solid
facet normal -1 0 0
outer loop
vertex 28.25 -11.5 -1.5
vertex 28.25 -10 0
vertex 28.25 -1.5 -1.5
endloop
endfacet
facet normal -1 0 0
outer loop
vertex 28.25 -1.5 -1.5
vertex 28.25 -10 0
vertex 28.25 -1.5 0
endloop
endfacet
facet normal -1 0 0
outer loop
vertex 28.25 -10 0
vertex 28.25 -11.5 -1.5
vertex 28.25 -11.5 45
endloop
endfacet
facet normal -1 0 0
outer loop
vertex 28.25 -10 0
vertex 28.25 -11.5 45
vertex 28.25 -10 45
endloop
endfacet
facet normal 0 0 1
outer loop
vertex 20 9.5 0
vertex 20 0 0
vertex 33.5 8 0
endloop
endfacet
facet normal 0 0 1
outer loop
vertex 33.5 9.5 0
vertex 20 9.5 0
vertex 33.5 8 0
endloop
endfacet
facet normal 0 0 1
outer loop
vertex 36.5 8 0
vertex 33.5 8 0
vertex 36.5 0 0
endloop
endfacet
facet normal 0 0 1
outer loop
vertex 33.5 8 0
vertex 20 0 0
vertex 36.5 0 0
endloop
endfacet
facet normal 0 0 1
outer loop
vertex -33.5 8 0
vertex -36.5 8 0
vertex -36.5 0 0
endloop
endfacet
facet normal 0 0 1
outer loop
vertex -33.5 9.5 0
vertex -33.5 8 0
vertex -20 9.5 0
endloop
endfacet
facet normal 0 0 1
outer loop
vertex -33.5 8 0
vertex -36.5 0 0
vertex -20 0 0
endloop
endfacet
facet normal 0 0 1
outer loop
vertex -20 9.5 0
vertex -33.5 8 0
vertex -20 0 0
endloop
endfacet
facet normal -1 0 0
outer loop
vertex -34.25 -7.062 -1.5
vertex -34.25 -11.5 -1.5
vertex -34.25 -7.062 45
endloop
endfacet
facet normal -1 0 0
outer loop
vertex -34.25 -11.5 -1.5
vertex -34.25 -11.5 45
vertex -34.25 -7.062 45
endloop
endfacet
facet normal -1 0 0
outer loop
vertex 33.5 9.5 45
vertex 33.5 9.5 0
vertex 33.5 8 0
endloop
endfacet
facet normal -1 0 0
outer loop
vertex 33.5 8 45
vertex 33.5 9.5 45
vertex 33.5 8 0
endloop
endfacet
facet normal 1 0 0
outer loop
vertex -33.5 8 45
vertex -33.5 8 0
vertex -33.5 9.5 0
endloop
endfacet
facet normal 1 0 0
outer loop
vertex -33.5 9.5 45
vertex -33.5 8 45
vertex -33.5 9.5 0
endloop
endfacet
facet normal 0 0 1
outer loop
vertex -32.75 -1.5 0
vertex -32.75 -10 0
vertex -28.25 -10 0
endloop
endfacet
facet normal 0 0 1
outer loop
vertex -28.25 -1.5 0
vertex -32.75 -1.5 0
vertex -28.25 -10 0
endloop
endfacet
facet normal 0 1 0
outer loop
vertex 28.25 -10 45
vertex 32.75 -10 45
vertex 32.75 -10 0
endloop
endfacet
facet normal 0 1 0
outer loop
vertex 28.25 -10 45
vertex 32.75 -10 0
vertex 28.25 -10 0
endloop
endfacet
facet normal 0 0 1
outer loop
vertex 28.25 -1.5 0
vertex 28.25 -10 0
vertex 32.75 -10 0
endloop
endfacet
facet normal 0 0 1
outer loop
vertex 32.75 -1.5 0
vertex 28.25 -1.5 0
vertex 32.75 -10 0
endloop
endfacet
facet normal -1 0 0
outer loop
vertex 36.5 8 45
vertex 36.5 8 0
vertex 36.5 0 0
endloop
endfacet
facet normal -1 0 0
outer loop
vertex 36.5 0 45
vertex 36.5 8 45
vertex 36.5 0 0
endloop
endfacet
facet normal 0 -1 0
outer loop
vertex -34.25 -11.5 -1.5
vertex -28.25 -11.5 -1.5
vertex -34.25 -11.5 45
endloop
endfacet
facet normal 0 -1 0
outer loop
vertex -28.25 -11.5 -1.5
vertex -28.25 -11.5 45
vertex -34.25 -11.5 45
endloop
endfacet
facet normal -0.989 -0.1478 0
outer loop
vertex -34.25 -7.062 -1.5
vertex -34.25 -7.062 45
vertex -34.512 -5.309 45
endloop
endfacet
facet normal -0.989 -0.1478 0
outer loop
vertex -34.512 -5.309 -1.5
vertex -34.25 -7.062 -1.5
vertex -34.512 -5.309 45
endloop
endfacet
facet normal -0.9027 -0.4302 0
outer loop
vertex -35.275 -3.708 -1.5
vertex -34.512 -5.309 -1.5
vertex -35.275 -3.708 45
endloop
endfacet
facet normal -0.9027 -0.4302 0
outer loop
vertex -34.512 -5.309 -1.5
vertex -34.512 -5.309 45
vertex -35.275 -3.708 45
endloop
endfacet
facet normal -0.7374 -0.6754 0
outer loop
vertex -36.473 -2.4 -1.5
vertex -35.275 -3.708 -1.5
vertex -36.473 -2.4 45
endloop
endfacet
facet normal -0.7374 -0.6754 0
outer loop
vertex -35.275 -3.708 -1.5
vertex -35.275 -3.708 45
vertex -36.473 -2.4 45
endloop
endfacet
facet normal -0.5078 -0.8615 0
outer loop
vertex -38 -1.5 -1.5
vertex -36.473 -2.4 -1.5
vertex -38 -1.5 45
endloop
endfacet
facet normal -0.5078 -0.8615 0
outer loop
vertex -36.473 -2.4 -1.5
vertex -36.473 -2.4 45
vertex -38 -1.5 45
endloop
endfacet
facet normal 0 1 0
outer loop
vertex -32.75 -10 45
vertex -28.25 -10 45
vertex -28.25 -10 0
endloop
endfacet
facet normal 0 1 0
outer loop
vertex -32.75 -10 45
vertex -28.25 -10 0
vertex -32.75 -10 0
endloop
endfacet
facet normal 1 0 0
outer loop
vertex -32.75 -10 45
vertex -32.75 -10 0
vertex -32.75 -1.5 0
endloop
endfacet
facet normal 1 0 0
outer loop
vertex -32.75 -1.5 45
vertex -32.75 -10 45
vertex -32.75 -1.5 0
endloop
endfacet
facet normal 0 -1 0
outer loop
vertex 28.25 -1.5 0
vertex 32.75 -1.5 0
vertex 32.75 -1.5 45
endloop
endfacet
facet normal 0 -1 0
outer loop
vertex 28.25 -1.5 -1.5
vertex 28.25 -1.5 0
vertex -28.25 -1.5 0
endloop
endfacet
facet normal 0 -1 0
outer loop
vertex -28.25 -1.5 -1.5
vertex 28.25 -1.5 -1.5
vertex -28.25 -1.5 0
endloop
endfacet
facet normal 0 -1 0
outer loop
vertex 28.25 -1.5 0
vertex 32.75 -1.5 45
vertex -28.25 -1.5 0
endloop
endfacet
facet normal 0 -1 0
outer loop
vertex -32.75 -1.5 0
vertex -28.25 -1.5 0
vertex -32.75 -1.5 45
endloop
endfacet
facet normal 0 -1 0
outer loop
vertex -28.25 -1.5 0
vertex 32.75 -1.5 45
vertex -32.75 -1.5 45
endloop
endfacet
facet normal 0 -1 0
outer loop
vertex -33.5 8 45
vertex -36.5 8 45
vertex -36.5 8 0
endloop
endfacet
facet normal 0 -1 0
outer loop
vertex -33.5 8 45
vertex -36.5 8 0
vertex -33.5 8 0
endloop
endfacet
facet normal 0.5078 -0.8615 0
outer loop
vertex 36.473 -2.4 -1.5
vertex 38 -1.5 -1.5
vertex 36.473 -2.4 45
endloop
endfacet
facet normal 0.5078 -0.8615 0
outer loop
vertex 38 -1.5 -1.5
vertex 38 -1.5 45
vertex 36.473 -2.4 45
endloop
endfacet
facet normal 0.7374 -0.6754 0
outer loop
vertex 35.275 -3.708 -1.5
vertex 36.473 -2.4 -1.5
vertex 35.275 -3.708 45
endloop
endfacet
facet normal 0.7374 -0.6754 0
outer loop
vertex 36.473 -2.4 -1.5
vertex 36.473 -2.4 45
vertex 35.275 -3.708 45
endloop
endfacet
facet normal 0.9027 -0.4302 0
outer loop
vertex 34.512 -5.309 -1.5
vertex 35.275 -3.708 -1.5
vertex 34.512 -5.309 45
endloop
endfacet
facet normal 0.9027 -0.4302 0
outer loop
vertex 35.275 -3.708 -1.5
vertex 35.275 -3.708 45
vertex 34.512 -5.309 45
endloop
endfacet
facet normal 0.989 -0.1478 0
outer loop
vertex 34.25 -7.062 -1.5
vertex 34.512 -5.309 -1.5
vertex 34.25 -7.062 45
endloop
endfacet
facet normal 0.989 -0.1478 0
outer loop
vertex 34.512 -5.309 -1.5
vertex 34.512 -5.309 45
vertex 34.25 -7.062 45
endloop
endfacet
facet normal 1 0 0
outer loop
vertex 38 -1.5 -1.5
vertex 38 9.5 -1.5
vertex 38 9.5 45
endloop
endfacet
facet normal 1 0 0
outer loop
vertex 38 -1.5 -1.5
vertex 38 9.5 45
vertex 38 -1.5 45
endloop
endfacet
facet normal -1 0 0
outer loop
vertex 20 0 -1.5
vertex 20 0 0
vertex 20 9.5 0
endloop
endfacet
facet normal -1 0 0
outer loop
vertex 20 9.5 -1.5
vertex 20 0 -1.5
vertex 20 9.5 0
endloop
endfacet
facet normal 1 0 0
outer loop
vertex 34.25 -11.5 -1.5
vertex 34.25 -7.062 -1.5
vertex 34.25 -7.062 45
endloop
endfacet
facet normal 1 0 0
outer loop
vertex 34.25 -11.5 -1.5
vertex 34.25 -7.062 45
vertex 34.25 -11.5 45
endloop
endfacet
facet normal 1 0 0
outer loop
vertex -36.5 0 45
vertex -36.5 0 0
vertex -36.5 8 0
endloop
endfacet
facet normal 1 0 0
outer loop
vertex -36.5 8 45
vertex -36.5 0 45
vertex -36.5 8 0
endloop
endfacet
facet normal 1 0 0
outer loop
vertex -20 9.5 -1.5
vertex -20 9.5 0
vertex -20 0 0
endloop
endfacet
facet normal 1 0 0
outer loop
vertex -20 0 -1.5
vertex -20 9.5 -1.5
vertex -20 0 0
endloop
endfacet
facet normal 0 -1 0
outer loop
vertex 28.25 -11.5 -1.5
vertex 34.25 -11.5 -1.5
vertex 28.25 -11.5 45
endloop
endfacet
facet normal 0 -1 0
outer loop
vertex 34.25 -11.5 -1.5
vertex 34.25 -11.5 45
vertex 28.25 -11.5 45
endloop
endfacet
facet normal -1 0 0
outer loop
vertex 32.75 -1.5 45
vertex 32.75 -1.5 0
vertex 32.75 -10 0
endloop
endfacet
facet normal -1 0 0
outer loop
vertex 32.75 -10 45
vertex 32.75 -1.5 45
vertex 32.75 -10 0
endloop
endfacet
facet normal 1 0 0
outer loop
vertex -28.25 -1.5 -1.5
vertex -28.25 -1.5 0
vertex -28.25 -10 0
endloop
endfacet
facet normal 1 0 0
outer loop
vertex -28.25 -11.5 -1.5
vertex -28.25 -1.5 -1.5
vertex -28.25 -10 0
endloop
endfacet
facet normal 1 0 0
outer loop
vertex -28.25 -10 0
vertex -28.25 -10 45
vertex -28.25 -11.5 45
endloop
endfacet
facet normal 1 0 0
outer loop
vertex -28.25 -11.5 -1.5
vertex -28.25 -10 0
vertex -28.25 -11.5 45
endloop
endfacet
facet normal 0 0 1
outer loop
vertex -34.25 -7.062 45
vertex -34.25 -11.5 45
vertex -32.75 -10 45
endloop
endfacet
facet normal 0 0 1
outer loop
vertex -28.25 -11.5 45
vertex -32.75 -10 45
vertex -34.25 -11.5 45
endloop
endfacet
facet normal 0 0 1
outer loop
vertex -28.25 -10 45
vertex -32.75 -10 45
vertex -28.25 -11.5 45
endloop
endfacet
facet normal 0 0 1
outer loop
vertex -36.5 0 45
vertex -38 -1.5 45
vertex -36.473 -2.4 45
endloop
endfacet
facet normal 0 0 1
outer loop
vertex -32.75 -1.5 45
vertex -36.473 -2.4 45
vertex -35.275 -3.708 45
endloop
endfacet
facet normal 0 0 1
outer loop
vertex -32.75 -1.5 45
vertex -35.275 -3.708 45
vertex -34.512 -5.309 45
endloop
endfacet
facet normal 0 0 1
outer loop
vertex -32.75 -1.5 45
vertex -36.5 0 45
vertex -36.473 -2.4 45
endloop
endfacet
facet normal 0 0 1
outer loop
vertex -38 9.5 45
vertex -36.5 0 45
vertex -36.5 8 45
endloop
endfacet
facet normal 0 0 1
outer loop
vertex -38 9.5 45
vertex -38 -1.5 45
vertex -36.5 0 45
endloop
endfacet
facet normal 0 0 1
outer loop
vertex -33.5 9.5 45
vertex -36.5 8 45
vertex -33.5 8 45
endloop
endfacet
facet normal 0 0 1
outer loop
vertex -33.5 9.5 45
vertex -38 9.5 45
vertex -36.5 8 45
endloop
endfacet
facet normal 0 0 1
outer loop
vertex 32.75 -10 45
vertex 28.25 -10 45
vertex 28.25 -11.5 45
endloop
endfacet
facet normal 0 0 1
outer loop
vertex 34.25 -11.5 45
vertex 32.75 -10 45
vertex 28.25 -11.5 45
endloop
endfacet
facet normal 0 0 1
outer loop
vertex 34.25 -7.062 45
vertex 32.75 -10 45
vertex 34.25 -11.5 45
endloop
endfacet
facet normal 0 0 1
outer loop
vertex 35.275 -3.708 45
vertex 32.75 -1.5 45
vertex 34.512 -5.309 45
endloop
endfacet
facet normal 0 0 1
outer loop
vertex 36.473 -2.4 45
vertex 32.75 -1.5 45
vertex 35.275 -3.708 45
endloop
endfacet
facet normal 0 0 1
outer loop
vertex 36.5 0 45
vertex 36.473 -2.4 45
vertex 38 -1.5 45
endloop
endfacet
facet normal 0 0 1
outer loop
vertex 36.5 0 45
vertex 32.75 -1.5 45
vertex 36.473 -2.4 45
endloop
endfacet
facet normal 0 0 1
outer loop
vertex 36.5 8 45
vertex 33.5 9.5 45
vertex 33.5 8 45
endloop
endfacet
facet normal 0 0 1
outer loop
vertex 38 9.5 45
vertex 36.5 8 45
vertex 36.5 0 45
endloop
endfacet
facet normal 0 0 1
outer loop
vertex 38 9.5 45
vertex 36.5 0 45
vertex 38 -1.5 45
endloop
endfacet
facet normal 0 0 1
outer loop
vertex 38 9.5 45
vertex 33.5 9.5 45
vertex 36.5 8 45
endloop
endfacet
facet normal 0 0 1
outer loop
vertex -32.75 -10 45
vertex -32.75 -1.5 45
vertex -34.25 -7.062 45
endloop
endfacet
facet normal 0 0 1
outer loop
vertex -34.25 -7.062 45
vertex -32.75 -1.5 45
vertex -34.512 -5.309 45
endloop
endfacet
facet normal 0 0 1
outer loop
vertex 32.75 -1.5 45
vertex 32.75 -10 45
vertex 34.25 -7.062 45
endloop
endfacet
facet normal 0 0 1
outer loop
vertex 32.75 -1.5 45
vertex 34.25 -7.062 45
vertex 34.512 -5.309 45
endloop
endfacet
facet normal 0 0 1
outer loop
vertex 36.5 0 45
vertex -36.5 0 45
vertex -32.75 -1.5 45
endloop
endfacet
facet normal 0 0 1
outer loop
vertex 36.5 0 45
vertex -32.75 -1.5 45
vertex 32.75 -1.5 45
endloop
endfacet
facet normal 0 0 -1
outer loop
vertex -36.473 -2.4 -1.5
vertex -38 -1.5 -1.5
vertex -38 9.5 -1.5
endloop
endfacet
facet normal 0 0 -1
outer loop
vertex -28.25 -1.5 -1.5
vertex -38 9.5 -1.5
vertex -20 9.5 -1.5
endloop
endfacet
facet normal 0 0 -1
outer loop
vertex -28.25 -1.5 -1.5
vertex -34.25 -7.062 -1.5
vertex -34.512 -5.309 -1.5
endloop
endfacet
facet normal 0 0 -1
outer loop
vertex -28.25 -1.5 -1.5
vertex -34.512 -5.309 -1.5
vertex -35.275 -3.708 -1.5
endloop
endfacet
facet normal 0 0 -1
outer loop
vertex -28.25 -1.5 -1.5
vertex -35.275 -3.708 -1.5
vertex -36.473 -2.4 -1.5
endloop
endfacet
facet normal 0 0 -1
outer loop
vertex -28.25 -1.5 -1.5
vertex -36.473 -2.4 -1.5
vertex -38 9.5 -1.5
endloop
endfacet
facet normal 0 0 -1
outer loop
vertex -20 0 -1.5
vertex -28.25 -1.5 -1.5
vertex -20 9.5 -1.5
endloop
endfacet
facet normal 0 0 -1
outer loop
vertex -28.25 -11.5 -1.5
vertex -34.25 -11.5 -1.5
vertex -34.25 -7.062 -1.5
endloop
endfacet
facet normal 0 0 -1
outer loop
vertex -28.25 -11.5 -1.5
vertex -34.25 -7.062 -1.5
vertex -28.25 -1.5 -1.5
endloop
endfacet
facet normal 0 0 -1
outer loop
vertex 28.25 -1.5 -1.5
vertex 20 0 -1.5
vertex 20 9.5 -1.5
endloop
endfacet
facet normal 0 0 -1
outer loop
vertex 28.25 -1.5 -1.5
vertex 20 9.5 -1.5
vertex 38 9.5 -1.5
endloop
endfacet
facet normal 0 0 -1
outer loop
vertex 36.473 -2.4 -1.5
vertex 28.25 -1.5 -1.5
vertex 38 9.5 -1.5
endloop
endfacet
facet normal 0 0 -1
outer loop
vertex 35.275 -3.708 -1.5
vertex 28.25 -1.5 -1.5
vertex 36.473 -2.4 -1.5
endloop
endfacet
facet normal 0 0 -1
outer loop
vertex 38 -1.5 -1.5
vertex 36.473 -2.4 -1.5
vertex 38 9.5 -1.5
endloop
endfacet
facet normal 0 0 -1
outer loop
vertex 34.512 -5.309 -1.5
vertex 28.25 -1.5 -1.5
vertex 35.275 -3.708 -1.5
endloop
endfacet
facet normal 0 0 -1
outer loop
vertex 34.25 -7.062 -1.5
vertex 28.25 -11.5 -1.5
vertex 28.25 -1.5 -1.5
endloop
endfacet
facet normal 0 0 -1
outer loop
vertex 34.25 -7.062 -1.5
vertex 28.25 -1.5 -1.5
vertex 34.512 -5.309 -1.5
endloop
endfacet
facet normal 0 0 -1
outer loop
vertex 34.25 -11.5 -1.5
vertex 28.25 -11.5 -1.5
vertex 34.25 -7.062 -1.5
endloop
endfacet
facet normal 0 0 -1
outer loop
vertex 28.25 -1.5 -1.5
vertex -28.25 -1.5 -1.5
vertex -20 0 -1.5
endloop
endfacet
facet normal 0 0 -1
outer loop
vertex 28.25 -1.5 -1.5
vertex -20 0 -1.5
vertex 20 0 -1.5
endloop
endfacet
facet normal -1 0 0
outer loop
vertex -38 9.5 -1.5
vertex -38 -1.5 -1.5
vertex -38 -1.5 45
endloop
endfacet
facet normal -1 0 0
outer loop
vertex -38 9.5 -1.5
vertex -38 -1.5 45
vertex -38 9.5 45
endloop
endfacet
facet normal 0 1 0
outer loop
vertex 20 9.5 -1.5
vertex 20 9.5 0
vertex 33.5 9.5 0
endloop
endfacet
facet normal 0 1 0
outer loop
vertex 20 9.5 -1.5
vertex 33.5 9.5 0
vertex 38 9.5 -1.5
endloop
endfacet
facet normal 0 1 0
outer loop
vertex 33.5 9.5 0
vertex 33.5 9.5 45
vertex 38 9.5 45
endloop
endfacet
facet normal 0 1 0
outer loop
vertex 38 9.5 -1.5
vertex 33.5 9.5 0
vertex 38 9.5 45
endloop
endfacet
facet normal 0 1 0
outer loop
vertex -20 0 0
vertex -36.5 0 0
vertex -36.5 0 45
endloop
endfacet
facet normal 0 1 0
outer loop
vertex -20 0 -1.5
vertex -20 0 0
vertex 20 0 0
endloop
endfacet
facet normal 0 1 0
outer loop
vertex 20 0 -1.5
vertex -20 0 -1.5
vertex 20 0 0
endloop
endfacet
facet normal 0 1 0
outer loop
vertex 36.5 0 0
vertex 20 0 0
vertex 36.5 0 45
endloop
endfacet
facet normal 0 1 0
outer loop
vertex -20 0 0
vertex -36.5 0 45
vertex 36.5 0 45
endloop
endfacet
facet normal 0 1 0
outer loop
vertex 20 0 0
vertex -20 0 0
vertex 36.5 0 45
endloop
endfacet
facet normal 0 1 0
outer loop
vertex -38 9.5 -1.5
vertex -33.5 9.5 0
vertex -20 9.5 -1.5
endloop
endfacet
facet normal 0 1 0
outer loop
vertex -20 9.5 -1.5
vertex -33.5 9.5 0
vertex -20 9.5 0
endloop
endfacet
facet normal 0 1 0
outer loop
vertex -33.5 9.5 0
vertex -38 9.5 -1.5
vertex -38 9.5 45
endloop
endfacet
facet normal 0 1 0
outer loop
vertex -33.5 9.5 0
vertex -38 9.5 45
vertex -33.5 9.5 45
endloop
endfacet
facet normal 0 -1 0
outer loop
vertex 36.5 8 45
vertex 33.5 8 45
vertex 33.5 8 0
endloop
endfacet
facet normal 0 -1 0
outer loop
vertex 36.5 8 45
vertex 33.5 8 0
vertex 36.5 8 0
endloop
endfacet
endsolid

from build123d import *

# Parameters (mm, degrees)
F1_DEPTH    = 45
F2_T1_DEPTH = 45
F3_W        = 4.5
F3_H        = 8.5
F4_DEPTH    = 1.5


# Not quite as in the source:
# - a fillet or chamfer that OpenCascade refuses, or shapes differently, is made with other operations: its cross-section is extruded or revolved along the edge and cut away or added


with BuildPart() as f1:
    # F0 (on Top) → F1 (new body)
    with BuildSketch(Plane.XY):
        Polygon((36.5, 0), (0, 0), (-36.5, 0), (-36.5, 8), (-33.5, 8), (-33.5, 9.5), (-38, 9.5), (-38, -1.5), (-34.25, -1.5), (-32.75, -1.5), (0, -1.5), (32.75, -1.5), (34.25, -1.5), (38, -1.5), (38, 9.5), (33.5, 9.5), (33.5, 8), (36.5, 8), align=None)
        Polygon((-32.75, -1.5), (-34.25, -1.5), (-34.25, -11.5), (-28.25, -11.5), (-28.25, -10), (-32.75, -10), align=None)
        Polygon((34.25, -11.5), (34.25, -1.5), (32.75, -1.5), (32.75, -10), (28.25, -10), (28.25, -11.5), align=None)
    extrude(amount=F1_DEPTH)

    # F2: fillet of radius 6 on 2 edges, made by hand

    # F2_s2 → F2_t1 (join)
    with BuildSketch(Plane.XY):
        with BuildLine():
            ThreePointArc((-38, -1.5), (-35.2750628145, -3.7080468991), (-34.25, -7.0621488653))
            Line((-34.25, -7.0621488653), (-34.25, -1.5))
            Line((-34.25, -1.5), (-38, -1.5))
        make_face()
        with BuildLine():
            ThreePointArc((34.25, -7.0621488653), (35.2750628145, -3.7080468991), (38, -1.5))
            Line((38, -1.5), (34.25, -1.5))
            Line((34.25, -1.5), (34.25, -7.0621488653))
        make_face()
    extrude(amount=F2_T1_DEPTH)

    # F3 (on face) → F4 (join)
    with BuildSketch(Plane(origin=(0, 0, 0), x_dir=(1, 0, 0), z_dir=(0, 0, -1))):
        with BuildLine():
            Line((-38, -9.5), (-33.5, -9.5))
            Line((-33.5, -9.5), (-33.5, -8))
            Line((-33.5, -8), (-36.5, -8))
            Line((-36.5, -8), (-36.5, 0))
            Line((-36.5, 0), (-20, 0))
            Line((-20, 0), (20, 0))
            Line((20, 0), (36.5, 0))
            Line((36.5, 0), (36.5, -8))
            Line((36.5, -8), (33.5, -8))
            Line((33.5, -8), (33.5, -9.5))
            Line((33.5, -9.5), (38, -9.5))
            Line((38, -9.5), (38, 1.5))
            ThreePointArc((38, 1.5), (35.2750628145, 3.7080468991), (34.25, 7.0621488653))
            Line((34.25, 7.0621488653), (34.25, 11.5))
            Line((34.25, 11.5), (28.25, 11.5))
            Line((28.25, 11.5), (28.25, 10))
            Line((28.25, 10), (32.75, 10))
            Line((32.75, 10), (32.75, 1.5))
            Line((32.75, 1.5), (28.25, 1.5))
            Line((28.25, 1.5), (-28.25, 1.5))
            Line((-28.25, 1.5), (-32.75, 1.5))
            Line((-32.75, 1.5), (-32.75, 10))
            Line((-32.75, 10), (-28.25, 10))
            Line((-28.25, 10), (-28.25, 11.5))
            Line((-28.25, 11.5), (-34.25, 11.5))
            Line((-34.25, 11.5), (-34.25, 7.0621488653))
            ThreePointArc((-34.25, 7.0621488653), (-35.2750628145, 3.7080468991), (-38, 1.5))
            Line((-38, 1.5), (-38, -9.5))
        make_face()
        with Locations((-30.5, 5.75)):
            Rectangle(F3_W, F3_H)
        Polygon((-33.5, -8), (-33.5, -9.5), (-20, -9.5), (-20, 0), (-36.5, 0), (-36.5, -8), align=None)
        Polygon((36.5, 0), (20, 0), (20, -9.5), (33.5, -9.5), (33.5, -8), (36.5, -8), align=None)
        with Locations((30.5, 5.75)):
            Rectangle(F3_W, F3_H)
    extrude(amount=F4_DEPTH)


solid = f1.part
